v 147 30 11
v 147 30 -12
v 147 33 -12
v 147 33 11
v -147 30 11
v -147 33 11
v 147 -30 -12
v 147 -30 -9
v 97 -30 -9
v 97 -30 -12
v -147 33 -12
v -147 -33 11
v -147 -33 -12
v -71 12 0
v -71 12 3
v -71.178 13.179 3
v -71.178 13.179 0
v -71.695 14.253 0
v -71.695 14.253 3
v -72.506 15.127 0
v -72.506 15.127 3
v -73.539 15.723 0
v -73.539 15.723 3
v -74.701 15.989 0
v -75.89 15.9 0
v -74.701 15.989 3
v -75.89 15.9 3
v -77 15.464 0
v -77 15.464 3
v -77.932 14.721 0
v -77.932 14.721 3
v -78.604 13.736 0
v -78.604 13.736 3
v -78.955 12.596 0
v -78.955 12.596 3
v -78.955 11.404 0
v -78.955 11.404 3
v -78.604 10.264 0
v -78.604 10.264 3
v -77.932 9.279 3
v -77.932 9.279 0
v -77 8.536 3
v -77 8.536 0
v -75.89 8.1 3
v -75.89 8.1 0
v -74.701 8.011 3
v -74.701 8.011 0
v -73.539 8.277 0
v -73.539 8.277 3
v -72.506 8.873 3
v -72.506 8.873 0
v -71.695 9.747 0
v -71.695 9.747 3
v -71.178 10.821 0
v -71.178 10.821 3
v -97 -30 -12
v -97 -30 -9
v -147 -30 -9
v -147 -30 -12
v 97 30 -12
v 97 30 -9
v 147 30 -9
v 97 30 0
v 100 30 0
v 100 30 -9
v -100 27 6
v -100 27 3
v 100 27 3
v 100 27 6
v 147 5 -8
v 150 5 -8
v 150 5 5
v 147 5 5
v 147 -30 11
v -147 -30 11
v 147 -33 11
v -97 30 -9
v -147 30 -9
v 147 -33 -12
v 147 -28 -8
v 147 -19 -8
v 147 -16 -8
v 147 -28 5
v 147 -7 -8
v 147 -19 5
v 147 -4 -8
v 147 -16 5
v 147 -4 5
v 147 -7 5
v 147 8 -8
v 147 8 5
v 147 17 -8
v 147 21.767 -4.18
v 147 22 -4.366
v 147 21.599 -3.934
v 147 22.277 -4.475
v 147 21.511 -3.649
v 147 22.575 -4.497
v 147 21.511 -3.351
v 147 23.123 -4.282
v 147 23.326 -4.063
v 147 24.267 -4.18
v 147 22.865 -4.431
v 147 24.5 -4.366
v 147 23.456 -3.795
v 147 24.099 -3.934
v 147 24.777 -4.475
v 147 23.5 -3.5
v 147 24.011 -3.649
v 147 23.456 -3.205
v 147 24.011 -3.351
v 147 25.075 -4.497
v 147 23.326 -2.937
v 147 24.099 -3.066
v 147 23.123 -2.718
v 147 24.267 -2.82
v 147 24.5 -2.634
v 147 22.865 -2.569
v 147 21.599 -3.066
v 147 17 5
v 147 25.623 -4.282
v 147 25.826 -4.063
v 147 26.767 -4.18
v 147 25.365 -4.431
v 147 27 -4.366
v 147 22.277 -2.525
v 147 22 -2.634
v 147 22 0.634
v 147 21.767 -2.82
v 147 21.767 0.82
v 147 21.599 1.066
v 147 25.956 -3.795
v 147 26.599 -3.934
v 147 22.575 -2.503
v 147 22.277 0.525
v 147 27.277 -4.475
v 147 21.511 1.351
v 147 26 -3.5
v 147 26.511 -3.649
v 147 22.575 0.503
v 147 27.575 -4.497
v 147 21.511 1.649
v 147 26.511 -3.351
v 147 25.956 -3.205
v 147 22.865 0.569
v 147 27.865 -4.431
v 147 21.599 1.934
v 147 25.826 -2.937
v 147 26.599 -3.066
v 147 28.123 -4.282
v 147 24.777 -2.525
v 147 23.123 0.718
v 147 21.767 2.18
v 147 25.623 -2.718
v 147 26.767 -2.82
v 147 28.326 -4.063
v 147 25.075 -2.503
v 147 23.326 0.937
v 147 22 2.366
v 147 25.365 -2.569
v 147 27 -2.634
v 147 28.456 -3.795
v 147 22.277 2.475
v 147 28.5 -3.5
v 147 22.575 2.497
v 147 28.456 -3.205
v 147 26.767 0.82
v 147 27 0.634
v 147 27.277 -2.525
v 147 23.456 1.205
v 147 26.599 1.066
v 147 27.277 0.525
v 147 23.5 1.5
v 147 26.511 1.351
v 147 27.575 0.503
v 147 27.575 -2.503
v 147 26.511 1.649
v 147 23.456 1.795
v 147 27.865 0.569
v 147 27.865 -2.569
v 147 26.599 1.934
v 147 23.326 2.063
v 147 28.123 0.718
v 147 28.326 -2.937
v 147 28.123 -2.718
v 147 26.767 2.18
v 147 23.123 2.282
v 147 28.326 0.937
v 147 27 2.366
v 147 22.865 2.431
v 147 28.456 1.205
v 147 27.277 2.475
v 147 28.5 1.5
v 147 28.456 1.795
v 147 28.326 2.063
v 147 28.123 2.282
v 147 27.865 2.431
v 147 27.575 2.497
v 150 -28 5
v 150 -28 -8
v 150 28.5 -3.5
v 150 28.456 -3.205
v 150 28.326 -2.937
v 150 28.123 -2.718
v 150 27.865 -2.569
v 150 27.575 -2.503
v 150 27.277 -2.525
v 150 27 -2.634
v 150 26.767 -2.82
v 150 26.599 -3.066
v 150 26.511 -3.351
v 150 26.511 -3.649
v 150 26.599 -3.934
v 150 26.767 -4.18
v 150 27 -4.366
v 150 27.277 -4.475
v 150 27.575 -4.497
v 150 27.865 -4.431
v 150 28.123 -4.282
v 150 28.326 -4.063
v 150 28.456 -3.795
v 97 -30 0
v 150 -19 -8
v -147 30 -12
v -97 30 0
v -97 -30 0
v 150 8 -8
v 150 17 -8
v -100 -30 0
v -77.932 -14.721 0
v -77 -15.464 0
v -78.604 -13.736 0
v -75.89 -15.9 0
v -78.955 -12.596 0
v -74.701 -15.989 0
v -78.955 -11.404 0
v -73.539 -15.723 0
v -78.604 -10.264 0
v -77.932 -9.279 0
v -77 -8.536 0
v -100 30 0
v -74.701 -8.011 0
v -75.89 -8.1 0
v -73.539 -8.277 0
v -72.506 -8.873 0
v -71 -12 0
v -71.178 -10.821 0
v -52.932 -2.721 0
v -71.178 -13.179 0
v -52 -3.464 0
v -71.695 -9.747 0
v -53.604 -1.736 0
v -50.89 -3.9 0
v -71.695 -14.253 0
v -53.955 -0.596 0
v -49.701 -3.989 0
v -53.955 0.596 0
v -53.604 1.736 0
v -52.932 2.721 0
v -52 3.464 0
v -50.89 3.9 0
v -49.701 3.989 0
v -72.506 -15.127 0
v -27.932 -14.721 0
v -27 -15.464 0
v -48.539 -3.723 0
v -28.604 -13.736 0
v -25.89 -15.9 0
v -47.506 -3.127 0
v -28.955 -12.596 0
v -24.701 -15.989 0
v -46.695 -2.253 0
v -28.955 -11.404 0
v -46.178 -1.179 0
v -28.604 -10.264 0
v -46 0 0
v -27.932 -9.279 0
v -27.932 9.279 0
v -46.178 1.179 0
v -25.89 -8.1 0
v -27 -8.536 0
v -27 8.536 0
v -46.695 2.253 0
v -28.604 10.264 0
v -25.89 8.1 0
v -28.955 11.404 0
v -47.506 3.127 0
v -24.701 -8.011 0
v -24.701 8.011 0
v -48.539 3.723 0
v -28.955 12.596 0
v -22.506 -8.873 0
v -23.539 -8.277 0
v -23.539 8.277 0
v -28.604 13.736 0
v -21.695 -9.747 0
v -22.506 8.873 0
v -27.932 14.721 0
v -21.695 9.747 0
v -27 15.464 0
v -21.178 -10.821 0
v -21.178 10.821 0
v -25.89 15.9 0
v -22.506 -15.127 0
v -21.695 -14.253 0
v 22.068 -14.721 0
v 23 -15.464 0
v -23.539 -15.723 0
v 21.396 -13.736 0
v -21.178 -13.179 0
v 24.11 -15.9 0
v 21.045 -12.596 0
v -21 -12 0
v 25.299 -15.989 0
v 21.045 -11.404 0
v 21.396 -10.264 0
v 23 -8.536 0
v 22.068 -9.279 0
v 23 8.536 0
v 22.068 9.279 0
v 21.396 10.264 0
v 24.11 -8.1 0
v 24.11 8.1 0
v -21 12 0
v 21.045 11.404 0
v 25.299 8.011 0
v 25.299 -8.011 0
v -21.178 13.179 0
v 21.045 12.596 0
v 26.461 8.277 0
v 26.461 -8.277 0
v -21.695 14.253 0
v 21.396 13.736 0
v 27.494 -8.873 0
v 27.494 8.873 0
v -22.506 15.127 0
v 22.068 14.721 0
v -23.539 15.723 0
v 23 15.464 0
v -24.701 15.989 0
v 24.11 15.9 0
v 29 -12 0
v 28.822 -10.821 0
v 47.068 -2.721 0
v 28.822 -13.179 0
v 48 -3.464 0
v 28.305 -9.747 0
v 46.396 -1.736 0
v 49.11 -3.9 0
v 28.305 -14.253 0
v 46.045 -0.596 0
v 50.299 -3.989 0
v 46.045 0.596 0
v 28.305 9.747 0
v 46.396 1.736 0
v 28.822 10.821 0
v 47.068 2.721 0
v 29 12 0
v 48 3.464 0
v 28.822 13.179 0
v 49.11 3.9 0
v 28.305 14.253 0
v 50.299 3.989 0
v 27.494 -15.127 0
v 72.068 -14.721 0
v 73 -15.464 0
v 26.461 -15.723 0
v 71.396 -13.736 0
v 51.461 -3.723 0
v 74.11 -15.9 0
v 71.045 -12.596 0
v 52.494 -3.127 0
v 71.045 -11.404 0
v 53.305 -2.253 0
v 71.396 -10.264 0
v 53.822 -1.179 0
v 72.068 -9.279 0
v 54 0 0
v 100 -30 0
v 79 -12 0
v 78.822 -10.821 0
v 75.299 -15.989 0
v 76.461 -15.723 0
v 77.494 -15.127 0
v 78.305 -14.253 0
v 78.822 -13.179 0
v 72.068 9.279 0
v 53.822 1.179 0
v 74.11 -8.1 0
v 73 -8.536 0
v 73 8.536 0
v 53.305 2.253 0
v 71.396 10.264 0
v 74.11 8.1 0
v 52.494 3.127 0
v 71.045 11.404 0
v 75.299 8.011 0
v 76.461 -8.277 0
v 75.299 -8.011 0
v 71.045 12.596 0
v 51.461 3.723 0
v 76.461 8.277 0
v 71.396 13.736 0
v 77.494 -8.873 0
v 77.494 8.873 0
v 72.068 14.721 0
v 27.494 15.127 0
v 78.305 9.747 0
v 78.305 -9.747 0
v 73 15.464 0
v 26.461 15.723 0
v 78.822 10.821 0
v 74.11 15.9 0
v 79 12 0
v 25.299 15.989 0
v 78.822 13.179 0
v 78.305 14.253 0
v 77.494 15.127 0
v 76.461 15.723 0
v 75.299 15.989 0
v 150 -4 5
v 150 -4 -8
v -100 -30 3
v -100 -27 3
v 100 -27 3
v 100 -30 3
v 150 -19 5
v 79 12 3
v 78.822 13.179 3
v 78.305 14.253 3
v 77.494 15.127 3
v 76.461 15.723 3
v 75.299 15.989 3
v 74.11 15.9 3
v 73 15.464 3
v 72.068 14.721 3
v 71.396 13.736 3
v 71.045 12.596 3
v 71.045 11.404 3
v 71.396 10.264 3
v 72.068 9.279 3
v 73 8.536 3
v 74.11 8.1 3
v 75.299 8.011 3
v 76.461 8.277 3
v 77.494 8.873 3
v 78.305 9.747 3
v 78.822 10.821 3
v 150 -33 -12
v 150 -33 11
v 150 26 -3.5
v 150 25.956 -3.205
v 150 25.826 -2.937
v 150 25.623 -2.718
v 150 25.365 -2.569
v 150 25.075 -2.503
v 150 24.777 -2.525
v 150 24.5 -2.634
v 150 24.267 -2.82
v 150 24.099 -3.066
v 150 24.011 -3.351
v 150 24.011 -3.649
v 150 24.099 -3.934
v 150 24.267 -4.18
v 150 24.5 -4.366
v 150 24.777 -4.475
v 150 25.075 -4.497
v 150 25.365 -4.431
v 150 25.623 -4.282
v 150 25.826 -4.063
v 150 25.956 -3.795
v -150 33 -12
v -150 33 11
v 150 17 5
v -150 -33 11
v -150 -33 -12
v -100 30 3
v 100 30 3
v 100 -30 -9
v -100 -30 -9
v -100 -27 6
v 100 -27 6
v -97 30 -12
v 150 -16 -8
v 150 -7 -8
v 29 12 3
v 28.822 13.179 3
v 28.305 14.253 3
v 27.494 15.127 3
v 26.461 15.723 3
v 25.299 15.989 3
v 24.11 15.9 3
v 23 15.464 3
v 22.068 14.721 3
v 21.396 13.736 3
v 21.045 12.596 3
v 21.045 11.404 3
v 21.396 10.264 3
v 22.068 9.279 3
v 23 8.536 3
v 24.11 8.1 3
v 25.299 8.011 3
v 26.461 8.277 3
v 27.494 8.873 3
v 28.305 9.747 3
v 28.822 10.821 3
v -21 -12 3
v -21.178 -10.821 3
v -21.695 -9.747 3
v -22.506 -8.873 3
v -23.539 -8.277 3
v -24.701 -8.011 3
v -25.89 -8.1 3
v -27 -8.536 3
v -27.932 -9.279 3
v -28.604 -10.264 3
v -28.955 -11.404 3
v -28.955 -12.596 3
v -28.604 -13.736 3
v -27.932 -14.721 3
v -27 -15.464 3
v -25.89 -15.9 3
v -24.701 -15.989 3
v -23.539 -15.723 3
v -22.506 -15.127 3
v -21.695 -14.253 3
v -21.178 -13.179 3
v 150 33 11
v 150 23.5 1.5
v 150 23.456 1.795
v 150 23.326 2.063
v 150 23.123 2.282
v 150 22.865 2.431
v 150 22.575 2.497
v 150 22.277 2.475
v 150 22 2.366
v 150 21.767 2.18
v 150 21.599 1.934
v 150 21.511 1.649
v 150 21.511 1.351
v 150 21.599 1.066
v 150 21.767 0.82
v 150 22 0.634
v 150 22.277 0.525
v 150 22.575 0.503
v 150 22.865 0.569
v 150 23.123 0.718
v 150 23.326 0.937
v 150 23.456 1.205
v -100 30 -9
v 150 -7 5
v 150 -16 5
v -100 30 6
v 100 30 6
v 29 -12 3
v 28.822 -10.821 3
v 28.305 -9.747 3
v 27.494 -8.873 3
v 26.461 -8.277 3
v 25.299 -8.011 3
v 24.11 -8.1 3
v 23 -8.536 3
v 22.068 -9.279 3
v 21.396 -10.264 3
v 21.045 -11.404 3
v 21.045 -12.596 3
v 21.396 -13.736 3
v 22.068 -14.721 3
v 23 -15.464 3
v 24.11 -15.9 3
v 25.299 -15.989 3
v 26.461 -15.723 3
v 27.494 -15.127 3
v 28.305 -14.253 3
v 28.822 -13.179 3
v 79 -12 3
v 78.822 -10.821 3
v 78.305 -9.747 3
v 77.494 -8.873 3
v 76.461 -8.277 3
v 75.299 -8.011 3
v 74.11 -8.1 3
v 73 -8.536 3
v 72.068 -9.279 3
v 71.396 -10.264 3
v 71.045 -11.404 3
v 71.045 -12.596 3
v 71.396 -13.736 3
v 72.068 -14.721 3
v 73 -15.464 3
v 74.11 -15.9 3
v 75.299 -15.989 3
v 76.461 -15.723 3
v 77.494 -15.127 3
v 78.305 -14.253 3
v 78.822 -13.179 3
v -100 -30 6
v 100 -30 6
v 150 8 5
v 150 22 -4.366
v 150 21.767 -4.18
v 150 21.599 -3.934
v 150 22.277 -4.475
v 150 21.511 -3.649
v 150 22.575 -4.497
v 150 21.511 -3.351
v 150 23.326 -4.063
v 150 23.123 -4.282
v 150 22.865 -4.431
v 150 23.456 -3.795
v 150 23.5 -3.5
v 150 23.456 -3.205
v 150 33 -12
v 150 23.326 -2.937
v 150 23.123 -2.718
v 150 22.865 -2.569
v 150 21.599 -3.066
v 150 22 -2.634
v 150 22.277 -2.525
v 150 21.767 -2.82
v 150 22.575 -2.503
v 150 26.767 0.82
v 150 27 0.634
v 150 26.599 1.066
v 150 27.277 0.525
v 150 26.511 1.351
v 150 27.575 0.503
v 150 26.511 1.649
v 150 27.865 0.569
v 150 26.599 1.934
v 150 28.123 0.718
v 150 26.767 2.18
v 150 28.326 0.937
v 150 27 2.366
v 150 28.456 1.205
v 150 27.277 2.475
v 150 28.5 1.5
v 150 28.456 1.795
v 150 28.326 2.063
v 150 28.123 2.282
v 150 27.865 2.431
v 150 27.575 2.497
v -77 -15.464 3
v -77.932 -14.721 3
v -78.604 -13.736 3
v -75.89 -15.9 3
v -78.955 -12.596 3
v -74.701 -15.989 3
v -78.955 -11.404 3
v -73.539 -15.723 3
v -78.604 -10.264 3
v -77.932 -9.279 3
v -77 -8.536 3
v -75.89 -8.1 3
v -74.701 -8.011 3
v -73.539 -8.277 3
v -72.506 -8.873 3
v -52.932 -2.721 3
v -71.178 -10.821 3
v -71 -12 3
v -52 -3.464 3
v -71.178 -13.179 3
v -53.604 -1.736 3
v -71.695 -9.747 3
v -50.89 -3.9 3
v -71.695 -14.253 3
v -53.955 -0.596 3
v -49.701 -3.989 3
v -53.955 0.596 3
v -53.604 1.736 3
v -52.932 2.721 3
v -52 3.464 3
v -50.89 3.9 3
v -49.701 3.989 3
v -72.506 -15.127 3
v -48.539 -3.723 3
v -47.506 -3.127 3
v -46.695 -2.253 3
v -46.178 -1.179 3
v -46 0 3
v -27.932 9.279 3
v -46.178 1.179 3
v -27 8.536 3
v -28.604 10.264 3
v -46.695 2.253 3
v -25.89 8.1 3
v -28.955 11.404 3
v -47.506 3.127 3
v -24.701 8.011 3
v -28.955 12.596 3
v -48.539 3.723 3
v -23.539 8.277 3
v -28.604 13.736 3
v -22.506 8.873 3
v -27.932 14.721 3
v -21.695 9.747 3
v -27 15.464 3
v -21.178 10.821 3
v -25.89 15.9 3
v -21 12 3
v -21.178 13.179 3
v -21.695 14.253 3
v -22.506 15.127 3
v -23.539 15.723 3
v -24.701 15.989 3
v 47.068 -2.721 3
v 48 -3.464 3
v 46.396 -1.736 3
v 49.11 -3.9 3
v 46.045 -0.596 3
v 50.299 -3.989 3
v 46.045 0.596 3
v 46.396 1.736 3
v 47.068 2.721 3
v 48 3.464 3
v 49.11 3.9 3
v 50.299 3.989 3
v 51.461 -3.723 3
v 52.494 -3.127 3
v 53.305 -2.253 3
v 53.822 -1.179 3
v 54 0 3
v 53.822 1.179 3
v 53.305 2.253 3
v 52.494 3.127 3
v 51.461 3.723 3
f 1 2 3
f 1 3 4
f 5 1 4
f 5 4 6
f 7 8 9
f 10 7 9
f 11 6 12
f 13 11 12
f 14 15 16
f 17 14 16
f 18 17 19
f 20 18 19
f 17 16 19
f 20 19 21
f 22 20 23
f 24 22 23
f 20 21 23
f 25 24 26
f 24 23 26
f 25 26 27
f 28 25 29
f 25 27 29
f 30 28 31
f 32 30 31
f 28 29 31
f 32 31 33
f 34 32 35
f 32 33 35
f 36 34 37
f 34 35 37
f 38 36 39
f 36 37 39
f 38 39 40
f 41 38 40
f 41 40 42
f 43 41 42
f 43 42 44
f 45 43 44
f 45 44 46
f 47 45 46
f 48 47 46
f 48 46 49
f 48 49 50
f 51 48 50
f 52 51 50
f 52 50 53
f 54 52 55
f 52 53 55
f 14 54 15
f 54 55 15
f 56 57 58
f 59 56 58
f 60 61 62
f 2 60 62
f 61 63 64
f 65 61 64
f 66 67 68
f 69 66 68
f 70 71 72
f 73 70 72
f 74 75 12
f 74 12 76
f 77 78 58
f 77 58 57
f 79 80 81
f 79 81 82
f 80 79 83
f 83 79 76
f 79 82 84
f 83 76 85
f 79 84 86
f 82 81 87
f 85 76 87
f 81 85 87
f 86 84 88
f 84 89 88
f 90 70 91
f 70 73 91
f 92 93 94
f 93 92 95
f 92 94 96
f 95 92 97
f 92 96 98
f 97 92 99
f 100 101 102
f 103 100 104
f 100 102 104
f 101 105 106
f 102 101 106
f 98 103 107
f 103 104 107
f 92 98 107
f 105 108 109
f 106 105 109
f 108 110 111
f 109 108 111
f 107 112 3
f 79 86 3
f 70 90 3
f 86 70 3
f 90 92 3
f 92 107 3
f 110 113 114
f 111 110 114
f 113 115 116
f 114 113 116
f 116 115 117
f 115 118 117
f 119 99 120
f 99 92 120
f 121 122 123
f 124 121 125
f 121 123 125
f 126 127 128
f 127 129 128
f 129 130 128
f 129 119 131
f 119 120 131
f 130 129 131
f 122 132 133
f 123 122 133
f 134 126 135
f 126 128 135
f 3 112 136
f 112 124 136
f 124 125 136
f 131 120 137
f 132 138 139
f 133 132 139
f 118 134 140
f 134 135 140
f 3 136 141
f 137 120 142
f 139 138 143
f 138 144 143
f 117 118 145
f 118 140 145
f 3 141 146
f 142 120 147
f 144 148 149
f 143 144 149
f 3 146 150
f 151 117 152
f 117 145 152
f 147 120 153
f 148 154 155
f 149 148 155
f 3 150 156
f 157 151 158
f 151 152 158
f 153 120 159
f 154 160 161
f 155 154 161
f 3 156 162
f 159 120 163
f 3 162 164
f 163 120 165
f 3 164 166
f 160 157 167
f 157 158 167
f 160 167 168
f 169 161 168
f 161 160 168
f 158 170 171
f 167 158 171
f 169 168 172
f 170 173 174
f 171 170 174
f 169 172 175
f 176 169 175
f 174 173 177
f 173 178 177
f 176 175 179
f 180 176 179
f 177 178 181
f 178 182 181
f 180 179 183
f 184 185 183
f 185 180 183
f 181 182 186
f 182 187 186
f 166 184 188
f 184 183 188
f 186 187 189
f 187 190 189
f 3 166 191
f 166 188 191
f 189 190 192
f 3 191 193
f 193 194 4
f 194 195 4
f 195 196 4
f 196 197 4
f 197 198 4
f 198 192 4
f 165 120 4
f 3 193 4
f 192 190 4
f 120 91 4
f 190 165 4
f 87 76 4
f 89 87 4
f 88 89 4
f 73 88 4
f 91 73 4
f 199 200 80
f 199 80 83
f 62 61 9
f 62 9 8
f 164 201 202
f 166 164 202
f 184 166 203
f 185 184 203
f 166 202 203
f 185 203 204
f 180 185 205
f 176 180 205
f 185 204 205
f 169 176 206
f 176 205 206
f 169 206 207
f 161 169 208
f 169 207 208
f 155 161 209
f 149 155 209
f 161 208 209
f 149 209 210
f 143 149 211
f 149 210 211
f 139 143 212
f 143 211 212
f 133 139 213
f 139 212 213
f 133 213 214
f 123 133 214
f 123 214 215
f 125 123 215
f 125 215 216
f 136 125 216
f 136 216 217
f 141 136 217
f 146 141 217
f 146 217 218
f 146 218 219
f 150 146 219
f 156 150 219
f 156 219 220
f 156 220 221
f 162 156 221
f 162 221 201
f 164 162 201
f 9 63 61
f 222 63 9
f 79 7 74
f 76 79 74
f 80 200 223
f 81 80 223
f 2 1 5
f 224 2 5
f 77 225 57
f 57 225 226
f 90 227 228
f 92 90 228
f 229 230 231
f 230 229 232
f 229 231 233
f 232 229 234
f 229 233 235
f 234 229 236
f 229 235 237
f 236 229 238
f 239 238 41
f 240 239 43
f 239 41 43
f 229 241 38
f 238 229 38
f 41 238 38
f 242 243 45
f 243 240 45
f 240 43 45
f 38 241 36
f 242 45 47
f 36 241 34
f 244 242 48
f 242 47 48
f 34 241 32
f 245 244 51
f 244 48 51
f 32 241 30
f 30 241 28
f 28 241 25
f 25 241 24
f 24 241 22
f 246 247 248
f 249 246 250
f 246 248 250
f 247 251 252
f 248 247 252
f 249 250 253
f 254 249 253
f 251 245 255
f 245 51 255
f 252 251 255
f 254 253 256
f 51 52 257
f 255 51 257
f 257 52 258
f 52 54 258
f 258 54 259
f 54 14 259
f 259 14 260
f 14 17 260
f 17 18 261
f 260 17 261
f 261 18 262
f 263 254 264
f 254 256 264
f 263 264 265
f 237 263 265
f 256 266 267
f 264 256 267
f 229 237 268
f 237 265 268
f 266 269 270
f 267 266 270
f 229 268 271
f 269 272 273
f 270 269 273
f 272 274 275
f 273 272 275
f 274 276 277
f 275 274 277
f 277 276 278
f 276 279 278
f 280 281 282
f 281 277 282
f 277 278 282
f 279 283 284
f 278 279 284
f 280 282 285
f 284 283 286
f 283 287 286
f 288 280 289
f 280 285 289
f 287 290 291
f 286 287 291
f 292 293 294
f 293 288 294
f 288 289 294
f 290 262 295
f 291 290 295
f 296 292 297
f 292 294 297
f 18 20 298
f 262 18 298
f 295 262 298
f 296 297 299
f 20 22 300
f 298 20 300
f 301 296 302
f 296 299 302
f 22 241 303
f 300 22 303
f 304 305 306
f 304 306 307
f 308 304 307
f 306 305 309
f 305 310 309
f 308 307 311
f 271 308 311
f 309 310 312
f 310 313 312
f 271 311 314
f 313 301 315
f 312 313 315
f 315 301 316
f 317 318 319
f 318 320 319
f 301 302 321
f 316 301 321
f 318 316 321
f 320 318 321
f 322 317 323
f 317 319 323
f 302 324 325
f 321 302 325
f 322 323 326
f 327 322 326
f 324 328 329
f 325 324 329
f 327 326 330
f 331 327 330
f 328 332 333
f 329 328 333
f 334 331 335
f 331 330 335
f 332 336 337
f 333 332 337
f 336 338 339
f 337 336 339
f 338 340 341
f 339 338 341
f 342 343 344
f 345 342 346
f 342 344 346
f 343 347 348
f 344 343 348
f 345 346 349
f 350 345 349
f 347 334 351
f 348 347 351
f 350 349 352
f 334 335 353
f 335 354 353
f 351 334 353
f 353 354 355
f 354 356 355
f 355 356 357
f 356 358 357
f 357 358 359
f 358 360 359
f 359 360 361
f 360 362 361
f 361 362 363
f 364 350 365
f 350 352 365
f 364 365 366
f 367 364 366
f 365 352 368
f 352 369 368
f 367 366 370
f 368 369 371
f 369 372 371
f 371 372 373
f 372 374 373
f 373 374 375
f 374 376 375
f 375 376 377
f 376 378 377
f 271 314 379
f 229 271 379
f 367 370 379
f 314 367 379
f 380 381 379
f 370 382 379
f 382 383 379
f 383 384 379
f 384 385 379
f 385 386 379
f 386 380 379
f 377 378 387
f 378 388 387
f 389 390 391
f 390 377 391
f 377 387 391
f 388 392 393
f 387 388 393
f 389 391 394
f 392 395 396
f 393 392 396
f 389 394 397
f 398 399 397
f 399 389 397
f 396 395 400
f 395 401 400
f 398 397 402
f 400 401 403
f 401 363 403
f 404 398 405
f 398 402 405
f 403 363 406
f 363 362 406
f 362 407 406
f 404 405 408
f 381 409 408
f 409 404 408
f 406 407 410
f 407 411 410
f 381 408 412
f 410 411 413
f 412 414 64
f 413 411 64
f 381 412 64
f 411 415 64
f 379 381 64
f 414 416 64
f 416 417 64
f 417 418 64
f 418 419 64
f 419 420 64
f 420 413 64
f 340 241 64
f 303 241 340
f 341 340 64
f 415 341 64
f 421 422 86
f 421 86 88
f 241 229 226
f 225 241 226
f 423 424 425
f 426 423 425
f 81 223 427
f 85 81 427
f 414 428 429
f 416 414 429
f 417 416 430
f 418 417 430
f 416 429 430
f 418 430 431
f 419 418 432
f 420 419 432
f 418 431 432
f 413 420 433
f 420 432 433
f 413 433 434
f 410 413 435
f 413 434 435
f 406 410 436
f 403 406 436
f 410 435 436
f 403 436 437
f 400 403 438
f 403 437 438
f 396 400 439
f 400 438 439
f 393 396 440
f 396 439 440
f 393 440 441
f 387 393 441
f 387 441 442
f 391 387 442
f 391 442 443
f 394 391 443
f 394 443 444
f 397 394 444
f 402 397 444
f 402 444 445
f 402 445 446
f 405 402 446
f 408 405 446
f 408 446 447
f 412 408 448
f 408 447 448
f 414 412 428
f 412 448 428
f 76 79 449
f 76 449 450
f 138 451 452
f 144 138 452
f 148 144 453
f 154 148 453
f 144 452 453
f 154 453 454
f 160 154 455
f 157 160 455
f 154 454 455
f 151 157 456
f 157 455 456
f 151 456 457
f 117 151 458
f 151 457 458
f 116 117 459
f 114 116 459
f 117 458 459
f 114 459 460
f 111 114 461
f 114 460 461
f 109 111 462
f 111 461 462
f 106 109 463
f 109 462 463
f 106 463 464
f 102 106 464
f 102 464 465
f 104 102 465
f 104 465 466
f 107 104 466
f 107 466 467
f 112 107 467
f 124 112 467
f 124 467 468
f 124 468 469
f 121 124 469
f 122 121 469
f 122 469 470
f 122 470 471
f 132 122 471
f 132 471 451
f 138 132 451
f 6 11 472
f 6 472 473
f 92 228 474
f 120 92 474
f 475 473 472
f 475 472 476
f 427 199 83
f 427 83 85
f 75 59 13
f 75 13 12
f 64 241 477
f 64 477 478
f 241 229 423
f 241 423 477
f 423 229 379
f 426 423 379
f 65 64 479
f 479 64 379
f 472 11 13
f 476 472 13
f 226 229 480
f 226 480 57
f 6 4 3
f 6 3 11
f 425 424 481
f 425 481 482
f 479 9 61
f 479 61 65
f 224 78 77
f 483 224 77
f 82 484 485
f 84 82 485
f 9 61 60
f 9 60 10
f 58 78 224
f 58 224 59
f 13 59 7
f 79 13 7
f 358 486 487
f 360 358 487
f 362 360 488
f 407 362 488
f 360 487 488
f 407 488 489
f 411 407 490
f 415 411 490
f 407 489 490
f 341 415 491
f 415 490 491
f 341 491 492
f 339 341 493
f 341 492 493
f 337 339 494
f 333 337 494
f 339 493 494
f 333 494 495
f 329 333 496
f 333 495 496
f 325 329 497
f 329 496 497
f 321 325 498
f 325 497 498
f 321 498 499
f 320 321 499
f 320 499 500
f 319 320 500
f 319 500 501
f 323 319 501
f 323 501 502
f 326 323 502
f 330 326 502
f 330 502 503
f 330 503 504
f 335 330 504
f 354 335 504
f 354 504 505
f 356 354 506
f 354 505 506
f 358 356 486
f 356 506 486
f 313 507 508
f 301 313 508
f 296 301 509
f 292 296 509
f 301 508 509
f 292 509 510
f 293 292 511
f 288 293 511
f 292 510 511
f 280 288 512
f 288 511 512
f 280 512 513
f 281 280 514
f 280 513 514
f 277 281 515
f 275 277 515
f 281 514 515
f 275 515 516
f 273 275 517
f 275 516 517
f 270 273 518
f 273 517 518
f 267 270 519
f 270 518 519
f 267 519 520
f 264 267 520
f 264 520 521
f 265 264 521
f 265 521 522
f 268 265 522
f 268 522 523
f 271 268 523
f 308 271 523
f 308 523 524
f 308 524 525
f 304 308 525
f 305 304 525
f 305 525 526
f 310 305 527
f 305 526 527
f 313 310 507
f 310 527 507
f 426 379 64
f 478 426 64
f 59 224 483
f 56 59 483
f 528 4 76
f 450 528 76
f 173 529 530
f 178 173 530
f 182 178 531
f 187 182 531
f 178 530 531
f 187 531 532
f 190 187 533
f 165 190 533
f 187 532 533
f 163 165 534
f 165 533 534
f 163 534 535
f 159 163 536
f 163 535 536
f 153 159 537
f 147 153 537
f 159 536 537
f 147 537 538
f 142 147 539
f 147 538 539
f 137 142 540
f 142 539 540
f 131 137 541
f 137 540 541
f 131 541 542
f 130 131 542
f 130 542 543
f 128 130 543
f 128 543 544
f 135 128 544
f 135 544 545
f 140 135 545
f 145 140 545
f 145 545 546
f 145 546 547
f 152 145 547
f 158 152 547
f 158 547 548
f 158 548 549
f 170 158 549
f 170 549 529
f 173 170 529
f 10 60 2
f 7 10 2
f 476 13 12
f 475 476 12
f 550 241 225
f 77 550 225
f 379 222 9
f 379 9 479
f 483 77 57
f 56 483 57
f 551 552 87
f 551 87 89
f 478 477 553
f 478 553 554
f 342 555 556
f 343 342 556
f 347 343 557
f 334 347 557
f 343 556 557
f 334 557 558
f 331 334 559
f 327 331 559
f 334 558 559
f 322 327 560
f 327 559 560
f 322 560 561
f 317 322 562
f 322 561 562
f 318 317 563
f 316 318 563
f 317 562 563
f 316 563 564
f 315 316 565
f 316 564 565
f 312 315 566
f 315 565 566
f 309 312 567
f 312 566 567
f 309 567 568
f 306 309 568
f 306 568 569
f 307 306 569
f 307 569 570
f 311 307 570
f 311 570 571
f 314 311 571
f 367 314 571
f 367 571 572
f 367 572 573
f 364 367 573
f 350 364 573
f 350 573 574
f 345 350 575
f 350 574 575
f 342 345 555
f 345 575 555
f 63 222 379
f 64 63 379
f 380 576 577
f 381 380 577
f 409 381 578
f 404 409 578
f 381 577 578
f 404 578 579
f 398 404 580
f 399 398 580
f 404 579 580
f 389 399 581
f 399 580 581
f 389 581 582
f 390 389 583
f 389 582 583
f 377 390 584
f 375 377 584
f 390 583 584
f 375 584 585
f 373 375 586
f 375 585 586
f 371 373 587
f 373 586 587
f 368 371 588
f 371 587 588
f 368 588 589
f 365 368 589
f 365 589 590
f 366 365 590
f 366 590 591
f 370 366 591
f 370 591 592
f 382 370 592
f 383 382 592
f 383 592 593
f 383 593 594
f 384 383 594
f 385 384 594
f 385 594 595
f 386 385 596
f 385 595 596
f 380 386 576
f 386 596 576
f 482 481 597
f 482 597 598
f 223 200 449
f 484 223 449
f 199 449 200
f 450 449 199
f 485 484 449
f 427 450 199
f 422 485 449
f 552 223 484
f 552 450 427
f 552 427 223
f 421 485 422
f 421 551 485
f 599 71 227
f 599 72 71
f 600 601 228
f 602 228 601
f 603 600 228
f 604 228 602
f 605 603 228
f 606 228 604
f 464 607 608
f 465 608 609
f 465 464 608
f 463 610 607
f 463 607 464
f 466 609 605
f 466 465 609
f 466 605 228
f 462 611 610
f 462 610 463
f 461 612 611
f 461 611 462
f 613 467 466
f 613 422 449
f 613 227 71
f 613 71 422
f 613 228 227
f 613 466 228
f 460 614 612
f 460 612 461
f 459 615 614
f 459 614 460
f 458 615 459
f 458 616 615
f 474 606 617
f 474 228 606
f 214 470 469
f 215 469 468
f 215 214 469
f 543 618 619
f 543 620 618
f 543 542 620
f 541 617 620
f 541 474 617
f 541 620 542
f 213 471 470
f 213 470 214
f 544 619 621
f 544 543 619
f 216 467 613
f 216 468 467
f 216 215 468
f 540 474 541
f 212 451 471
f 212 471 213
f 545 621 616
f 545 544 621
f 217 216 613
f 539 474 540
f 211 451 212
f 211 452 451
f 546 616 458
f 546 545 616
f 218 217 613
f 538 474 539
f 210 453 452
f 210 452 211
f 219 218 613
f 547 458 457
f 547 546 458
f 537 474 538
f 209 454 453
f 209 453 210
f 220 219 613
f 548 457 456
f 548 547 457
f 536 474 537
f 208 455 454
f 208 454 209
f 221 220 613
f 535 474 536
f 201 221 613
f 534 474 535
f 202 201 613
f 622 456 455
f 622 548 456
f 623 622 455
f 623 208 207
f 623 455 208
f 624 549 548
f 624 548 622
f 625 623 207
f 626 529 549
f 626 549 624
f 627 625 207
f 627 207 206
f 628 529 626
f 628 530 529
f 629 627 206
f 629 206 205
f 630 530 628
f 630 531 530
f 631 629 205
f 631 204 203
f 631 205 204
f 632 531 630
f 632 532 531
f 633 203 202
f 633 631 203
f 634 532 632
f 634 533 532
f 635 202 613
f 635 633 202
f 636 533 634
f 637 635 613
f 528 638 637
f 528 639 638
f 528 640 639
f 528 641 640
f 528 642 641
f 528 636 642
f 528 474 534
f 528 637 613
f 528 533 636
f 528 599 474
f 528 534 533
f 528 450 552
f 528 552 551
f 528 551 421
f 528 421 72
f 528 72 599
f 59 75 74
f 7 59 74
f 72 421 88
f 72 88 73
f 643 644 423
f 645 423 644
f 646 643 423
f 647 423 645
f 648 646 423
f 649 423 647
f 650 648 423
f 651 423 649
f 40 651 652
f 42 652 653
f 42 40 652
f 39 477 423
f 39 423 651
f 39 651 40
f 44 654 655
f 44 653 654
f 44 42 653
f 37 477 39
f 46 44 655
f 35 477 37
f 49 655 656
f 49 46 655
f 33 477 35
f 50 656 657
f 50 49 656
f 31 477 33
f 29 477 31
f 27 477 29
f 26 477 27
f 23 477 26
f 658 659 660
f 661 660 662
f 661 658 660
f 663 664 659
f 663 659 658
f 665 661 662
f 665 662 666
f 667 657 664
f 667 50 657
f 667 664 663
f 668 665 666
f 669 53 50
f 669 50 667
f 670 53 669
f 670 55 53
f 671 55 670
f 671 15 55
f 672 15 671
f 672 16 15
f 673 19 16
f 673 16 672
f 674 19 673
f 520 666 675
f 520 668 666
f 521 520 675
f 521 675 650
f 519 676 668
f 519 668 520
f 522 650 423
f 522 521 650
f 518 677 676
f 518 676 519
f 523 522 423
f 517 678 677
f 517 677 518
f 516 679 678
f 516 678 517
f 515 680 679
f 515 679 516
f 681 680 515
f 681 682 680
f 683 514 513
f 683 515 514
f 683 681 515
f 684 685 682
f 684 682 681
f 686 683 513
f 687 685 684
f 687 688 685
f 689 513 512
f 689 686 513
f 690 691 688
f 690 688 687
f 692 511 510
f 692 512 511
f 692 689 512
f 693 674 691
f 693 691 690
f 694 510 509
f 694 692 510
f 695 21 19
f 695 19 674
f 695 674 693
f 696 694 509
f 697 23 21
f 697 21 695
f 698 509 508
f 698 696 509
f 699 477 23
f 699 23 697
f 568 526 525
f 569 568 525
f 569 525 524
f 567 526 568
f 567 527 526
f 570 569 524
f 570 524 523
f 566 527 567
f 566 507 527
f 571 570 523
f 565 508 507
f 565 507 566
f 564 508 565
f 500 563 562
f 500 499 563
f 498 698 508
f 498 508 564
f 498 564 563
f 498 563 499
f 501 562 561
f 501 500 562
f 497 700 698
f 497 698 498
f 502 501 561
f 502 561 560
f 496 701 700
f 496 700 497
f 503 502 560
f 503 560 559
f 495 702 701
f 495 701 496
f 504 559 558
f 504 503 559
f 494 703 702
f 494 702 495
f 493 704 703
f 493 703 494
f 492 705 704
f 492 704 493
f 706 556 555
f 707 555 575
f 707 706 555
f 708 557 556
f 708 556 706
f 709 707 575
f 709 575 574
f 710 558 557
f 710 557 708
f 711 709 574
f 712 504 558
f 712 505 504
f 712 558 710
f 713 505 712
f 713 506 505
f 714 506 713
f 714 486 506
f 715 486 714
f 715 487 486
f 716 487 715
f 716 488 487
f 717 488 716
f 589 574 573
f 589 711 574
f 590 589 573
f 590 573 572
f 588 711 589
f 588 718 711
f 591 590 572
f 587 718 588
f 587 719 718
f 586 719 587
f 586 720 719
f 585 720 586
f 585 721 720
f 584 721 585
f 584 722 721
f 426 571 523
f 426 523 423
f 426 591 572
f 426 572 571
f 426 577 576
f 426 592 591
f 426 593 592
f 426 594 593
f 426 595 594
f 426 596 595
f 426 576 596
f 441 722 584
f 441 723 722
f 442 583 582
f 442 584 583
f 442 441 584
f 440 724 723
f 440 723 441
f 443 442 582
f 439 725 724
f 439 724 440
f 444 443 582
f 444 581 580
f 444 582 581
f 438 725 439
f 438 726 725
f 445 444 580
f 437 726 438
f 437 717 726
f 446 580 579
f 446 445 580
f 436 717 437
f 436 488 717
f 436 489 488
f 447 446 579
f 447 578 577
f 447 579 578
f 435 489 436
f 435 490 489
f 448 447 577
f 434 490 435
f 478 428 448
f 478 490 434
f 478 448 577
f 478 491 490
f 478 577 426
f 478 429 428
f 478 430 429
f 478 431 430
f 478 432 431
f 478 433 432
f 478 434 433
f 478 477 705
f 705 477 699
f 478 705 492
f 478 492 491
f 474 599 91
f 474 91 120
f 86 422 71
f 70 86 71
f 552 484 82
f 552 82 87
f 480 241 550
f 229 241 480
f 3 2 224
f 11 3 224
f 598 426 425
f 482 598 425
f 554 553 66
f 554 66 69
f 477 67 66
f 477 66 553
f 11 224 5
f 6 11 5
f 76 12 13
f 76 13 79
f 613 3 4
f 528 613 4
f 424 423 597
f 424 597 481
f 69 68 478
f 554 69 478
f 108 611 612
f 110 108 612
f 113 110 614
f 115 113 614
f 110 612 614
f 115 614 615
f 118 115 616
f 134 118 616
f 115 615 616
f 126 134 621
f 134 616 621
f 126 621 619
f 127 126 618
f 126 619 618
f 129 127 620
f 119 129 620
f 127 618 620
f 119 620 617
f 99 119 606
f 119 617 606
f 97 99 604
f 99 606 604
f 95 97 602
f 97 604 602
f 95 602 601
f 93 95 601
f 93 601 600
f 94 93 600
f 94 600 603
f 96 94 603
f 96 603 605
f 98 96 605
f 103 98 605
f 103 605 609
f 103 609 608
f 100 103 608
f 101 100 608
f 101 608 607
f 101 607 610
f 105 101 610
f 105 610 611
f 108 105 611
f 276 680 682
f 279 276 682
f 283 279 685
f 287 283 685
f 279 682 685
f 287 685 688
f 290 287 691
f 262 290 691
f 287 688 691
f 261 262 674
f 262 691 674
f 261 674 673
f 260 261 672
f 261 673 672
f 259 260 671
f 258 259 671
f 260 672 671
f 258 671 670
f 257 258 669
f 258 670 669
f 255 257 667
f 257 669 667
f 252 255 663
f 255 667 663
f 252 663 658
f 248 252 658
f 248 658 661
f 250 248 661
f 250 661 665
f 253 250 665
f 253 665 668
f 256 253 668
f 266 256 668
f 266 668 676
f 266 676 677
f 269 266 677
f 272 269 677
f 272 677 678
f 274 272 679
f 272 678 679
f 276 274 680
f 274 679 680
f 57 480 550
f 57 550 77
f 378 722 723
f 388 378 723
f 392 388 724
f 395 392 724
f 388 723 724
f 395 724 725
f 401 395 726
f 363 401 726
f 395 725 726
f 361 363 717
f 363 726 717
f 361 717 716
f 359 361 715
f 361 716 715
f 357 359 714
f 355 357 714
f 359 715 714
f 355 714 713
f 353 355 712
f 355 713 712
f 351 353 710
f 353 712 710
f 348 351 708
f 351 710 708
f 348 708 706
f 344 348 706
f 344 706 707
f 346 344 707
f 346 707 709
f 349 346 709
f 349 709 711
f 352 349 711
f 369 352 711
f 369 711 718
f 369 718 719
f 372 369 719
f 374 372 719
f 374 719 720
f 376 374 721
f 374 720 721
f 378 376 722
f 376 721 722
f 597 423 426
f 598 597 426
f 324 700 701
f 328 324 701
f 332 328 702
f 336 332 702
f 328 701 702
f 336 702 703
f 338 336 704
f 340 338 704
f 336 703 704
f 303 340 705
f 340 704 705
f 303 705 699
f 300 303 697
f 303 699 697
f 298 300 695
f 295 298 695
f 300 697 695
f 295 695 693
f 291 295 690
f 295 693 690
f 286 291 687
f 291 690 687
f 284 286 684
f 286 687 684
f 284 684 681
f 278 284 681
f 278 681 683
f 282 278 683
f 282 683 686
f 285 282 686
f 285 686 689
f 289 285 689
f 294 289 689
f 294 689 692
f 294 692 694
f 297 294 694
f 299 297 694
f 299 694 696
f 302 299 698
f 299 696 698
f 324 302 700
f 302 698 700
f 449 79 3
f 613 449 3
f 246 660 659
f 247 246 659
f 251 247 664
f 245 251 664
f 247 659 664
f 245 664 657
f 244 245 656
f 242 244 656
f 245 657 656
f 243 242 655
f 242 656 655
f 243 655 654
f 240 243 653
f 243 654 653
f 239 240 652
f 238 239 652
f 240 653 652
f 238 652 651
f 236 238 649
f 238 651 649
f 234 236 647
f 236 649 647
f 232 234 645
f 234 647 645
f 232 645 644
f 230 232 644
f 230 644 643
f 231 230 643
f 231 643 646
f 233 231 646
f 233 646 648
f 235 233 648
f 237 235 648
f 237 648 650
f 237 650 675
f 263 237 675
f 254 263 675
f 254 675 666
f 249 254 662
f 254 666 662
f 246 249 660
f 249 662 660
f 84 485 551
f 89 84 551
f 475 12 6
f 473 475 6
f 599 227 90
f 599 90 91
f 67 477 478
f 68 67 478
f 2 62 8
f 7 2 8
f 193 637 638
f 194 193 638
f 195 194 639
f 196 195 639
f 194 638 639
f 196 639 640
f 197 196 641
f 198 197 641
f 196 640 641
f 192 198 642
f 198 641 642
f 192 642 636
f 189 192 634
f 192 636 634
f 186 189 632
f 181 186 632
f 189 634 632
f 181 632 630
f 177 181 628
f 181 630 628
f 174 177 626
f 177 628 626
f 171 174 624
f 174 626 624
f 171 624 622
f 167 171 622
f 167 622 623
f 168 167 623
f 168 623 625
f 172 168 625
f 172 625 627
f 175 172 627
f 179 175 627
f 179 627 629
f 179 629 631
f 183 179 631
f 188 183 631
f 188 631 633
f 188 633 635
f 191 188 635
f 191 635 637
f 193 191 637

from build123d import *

# Parameters (mm, degrees)
F0_W      = 200
F0_H      = 60
F1_DEPTH  = 3
F2_W      = 3
F2_H      = 60
F3_DEPTH  = 9
F4_W      = 47
F4_H      = 60
F4_W_2    = 3
F5_DEPTH  = 3
F6_W      = 47
F6_H      = 60
F6_W_2    = 3
F7_DEPTH  = 3
F8_W      = 200
F8_H      = 3
F9_DEPTH  = 3
F10_R     = 4
F11_DEPTH = 3
F12_W     = 294
F12_H     = 23
F12_W_2   = 200
F12_H_2   = 3
F13_DEPTH = 3
F14_W     = 294
F14_H     = 23
F14_W_2   = 200
F14_H_2   = 3
F15_DEPTH = 3
F16_W     = 63
F16_H     = 23
F16_W_2   = 3
F17_DEPTH = 3
F18_W     = 3
F18_H     = 23
F18_W_2   = 63
F19_DEPTH = 3
F20_W     = 9
F20_H     = 13
F20_R     = 1
F21_DEPTH = 25


# Not quite as in the source:
# - a feature names something its author has since deleted; it is built from what else it names


with BuildPart() as f1:
    # F0 (on Top) → F1 (new body)
    with BuildSketch(Plane.XY):
        Rectangle(F0_W, F0_H)
    extrude(amount=F1_DEPTH)

    # F10 (on face) → F11 (cut)
    with BuildSketch(Plane.XY.offset(3)):
        with Locations((-75, 12)):
            Circle(F10_R)
        with Locations((-75, -12)):
            Circle(F10_R)
        with Locations((-25, -12)):
            Circle(F10_R)
        with Locations((-25, 12)):
            Circle(F10_R)
        with Locations((25, 12)):
            Circle(F10_R)
        with Locations((25, -12)):
            Circle(F10_R)
        with Locations((50, 0)):
            Circle(F10_R)
        with Locations((75, 12)):
            Circle(F10_R)
        with Locations((75, -12)):
            Circle(F10_R)
        with Locations((-50, 0)):
            Circle(F10_R)
    extrude(amount=-F11_DEPTH, mode=Mode.SUBTRACT)


with BuildPart() as f3:
    # F2 (on face) → F3 (new body)
    with BuildSketch(Plane(origin=(0, 0, 0), x_dir=(1, 0, 0), z_dir=(0, 0, -1))):
        with Locations((-98.5, 0)):
            Rectangle(F2_W, F2_H)
    extrude(amount=F3_DEPTH)


with BuildPart() as f3b:
    # F2 (on face) → F3, piece 2 (new body)
    with BuildSketch(Plane(origin=(0, 0, 0), x_dir=(1, 0, 0), z_dir=(0, 0, -1))):
        with Locations((98.5, 0)):
            Rectangle(F2_W, F2_H)
    extrude(amount=F3_DEPTH)


with BuildPart() as f5:
    # F4 (on face) → F5 (new body)
    with BuildSketch(Plane(origin=(0, 0, -9), x_dir=(1, 0, 0), z_dir=(0, 0, -1))):
        with Locations((123.5, 0)):
            Rectangle(F4_W, F4_H)
        with Locations((98.5, 0)):
            Rectangle(F4_W_2, F4_H)
    extrude(amount=F5_DEPTH)


with BuildPart() as f7:
    # F6 (on face) → F7 (new body)
    with BuildSketch(Plane(origin=(0, 0, -9), x_dir=(1, 0, 0), z_dir=(0, 0, -1))):
        with Locations((-123.5, 0)):
            Rectangle(F6_W, F6_H)
        with Locations((-98.5, 0)):
            Rectangle(F6_W_2, F6_H)
    extrude(amount=F7_DEPTH)


with BuildPart() as f9:
    # F8 (on face) → F9 (new body)
    with BuildSketch(Plane.XY.offset(3)):
        with Locations((0, 28.5)):
            Rectangle(F8_W, F8_H)
    extrude(amount=F9_DEPTH)


with BuildPart() as f9b:
    # F8 (on face) → F9, piece 2 (new body)
    with BuildSketch(Plane.XY.offset(3)):
        with Locations((0, -28.5)):
            Rectangle(F8_W, F8_H)
    extrude(amount=F9_DEPTH)


with BuildPart() as f13:
    # F12 (on face) → F13 (new body)
    with BuildSketch(Plane.XZ.offset(30)):
        with Locations((0, -0.5)):
            Rectangle(F12_W, F12_H)
        with Locations((0, 1.5)):
            Rectangle(F12_W_2, F12_H_2, mode=Mode.SUBTRACT)
        with Locations((0, 1.5)):
            Rectangle(F12_W_2, F12_H_2)
    extrude(amount=F13_DEPTH)


with BuildPart() as f15:
    # F14 (on face) → F15 (new body)
    with BuildSketch(Plane(origin=(0, 30, 0), x_dir=(-1, 0, 0), z_dir=(0, 1, 0))):
        with Locations((0, -0.5)):
            Rectangle(F14_W, F14_H)
        with Locations((0, 1.5)):
            Rectangle(F14_W_2, F14_H_2, mode=Mode.SUBTRACT)
        with Locations((0, 1.5)):
            Rectangle(F14_W_2, F14_H_2)
    extrude(amount=F15_DEPTH)


with BuildPart() as f17:
    # F16 (on face) → F17 (new body)
    with BuildSketch(Plane.YZ.offset(147)):
        with Locations((1.5, -0.5)):
            Rectangle(F16_W, F16_H)
        with Locations((-31.5, -0.5)):
            Rectangle(F16_W_2, F16_H)
    extrude(amount=F17_DEPTH)

    # F20 (on face) → F21 (cut)
    with BuildSketch(Plane.YZ.offset(150)):
        with Locations((-23.5, -1.5)):
            Rectangle(F20_W, F20_H)
        with Locations((-11.5, -1.5)):
            Rectangle(F20_W, F20_H)
        with Locations((0.5, -1.5)):
            Rectangle(F20_W, F20_H)
        with Locations((12.5, -1.5)):
            Rectangle(F20_W, F20_H)
        with Locations((22.5, 1.5)):
            Circle(F20_R)
        with Locations((27.5, 1.5)):
            Circle(F20_R)
        with Locations((27.5, -3.5)):
            Circle(F20_R)
        with Locations((25, -3.5)):
            Circle(F20_R)
        with Locations((22.5, -3.5)):
            Circle(F20_R)
    extrude(amount=-F21_DEPTH, mode=Mode.SUBTRACT)


with BuildPart() as f19:
    # F18 (on face) → F19 (new body)
    with BuildSketch(Plane(origin=(-147, 0, 0), x_dir=(0, -1, 0), z_dir=(-1, 0, 0))):
        with Locations((-31.5, -0.5)):
            Rectangle(F18_W, F18_H)
        with Locations((1.5, -0.5)):
            Rectangle(F18_W_2, F18_H)
    extrude(amount=F19_DEPTH)


solid = Compound([f1.part, f3.part, f3b.part, f5.part, f7.part, f9.part, f9b.part, f13.part, f15.part, f17.part, f19.part])
